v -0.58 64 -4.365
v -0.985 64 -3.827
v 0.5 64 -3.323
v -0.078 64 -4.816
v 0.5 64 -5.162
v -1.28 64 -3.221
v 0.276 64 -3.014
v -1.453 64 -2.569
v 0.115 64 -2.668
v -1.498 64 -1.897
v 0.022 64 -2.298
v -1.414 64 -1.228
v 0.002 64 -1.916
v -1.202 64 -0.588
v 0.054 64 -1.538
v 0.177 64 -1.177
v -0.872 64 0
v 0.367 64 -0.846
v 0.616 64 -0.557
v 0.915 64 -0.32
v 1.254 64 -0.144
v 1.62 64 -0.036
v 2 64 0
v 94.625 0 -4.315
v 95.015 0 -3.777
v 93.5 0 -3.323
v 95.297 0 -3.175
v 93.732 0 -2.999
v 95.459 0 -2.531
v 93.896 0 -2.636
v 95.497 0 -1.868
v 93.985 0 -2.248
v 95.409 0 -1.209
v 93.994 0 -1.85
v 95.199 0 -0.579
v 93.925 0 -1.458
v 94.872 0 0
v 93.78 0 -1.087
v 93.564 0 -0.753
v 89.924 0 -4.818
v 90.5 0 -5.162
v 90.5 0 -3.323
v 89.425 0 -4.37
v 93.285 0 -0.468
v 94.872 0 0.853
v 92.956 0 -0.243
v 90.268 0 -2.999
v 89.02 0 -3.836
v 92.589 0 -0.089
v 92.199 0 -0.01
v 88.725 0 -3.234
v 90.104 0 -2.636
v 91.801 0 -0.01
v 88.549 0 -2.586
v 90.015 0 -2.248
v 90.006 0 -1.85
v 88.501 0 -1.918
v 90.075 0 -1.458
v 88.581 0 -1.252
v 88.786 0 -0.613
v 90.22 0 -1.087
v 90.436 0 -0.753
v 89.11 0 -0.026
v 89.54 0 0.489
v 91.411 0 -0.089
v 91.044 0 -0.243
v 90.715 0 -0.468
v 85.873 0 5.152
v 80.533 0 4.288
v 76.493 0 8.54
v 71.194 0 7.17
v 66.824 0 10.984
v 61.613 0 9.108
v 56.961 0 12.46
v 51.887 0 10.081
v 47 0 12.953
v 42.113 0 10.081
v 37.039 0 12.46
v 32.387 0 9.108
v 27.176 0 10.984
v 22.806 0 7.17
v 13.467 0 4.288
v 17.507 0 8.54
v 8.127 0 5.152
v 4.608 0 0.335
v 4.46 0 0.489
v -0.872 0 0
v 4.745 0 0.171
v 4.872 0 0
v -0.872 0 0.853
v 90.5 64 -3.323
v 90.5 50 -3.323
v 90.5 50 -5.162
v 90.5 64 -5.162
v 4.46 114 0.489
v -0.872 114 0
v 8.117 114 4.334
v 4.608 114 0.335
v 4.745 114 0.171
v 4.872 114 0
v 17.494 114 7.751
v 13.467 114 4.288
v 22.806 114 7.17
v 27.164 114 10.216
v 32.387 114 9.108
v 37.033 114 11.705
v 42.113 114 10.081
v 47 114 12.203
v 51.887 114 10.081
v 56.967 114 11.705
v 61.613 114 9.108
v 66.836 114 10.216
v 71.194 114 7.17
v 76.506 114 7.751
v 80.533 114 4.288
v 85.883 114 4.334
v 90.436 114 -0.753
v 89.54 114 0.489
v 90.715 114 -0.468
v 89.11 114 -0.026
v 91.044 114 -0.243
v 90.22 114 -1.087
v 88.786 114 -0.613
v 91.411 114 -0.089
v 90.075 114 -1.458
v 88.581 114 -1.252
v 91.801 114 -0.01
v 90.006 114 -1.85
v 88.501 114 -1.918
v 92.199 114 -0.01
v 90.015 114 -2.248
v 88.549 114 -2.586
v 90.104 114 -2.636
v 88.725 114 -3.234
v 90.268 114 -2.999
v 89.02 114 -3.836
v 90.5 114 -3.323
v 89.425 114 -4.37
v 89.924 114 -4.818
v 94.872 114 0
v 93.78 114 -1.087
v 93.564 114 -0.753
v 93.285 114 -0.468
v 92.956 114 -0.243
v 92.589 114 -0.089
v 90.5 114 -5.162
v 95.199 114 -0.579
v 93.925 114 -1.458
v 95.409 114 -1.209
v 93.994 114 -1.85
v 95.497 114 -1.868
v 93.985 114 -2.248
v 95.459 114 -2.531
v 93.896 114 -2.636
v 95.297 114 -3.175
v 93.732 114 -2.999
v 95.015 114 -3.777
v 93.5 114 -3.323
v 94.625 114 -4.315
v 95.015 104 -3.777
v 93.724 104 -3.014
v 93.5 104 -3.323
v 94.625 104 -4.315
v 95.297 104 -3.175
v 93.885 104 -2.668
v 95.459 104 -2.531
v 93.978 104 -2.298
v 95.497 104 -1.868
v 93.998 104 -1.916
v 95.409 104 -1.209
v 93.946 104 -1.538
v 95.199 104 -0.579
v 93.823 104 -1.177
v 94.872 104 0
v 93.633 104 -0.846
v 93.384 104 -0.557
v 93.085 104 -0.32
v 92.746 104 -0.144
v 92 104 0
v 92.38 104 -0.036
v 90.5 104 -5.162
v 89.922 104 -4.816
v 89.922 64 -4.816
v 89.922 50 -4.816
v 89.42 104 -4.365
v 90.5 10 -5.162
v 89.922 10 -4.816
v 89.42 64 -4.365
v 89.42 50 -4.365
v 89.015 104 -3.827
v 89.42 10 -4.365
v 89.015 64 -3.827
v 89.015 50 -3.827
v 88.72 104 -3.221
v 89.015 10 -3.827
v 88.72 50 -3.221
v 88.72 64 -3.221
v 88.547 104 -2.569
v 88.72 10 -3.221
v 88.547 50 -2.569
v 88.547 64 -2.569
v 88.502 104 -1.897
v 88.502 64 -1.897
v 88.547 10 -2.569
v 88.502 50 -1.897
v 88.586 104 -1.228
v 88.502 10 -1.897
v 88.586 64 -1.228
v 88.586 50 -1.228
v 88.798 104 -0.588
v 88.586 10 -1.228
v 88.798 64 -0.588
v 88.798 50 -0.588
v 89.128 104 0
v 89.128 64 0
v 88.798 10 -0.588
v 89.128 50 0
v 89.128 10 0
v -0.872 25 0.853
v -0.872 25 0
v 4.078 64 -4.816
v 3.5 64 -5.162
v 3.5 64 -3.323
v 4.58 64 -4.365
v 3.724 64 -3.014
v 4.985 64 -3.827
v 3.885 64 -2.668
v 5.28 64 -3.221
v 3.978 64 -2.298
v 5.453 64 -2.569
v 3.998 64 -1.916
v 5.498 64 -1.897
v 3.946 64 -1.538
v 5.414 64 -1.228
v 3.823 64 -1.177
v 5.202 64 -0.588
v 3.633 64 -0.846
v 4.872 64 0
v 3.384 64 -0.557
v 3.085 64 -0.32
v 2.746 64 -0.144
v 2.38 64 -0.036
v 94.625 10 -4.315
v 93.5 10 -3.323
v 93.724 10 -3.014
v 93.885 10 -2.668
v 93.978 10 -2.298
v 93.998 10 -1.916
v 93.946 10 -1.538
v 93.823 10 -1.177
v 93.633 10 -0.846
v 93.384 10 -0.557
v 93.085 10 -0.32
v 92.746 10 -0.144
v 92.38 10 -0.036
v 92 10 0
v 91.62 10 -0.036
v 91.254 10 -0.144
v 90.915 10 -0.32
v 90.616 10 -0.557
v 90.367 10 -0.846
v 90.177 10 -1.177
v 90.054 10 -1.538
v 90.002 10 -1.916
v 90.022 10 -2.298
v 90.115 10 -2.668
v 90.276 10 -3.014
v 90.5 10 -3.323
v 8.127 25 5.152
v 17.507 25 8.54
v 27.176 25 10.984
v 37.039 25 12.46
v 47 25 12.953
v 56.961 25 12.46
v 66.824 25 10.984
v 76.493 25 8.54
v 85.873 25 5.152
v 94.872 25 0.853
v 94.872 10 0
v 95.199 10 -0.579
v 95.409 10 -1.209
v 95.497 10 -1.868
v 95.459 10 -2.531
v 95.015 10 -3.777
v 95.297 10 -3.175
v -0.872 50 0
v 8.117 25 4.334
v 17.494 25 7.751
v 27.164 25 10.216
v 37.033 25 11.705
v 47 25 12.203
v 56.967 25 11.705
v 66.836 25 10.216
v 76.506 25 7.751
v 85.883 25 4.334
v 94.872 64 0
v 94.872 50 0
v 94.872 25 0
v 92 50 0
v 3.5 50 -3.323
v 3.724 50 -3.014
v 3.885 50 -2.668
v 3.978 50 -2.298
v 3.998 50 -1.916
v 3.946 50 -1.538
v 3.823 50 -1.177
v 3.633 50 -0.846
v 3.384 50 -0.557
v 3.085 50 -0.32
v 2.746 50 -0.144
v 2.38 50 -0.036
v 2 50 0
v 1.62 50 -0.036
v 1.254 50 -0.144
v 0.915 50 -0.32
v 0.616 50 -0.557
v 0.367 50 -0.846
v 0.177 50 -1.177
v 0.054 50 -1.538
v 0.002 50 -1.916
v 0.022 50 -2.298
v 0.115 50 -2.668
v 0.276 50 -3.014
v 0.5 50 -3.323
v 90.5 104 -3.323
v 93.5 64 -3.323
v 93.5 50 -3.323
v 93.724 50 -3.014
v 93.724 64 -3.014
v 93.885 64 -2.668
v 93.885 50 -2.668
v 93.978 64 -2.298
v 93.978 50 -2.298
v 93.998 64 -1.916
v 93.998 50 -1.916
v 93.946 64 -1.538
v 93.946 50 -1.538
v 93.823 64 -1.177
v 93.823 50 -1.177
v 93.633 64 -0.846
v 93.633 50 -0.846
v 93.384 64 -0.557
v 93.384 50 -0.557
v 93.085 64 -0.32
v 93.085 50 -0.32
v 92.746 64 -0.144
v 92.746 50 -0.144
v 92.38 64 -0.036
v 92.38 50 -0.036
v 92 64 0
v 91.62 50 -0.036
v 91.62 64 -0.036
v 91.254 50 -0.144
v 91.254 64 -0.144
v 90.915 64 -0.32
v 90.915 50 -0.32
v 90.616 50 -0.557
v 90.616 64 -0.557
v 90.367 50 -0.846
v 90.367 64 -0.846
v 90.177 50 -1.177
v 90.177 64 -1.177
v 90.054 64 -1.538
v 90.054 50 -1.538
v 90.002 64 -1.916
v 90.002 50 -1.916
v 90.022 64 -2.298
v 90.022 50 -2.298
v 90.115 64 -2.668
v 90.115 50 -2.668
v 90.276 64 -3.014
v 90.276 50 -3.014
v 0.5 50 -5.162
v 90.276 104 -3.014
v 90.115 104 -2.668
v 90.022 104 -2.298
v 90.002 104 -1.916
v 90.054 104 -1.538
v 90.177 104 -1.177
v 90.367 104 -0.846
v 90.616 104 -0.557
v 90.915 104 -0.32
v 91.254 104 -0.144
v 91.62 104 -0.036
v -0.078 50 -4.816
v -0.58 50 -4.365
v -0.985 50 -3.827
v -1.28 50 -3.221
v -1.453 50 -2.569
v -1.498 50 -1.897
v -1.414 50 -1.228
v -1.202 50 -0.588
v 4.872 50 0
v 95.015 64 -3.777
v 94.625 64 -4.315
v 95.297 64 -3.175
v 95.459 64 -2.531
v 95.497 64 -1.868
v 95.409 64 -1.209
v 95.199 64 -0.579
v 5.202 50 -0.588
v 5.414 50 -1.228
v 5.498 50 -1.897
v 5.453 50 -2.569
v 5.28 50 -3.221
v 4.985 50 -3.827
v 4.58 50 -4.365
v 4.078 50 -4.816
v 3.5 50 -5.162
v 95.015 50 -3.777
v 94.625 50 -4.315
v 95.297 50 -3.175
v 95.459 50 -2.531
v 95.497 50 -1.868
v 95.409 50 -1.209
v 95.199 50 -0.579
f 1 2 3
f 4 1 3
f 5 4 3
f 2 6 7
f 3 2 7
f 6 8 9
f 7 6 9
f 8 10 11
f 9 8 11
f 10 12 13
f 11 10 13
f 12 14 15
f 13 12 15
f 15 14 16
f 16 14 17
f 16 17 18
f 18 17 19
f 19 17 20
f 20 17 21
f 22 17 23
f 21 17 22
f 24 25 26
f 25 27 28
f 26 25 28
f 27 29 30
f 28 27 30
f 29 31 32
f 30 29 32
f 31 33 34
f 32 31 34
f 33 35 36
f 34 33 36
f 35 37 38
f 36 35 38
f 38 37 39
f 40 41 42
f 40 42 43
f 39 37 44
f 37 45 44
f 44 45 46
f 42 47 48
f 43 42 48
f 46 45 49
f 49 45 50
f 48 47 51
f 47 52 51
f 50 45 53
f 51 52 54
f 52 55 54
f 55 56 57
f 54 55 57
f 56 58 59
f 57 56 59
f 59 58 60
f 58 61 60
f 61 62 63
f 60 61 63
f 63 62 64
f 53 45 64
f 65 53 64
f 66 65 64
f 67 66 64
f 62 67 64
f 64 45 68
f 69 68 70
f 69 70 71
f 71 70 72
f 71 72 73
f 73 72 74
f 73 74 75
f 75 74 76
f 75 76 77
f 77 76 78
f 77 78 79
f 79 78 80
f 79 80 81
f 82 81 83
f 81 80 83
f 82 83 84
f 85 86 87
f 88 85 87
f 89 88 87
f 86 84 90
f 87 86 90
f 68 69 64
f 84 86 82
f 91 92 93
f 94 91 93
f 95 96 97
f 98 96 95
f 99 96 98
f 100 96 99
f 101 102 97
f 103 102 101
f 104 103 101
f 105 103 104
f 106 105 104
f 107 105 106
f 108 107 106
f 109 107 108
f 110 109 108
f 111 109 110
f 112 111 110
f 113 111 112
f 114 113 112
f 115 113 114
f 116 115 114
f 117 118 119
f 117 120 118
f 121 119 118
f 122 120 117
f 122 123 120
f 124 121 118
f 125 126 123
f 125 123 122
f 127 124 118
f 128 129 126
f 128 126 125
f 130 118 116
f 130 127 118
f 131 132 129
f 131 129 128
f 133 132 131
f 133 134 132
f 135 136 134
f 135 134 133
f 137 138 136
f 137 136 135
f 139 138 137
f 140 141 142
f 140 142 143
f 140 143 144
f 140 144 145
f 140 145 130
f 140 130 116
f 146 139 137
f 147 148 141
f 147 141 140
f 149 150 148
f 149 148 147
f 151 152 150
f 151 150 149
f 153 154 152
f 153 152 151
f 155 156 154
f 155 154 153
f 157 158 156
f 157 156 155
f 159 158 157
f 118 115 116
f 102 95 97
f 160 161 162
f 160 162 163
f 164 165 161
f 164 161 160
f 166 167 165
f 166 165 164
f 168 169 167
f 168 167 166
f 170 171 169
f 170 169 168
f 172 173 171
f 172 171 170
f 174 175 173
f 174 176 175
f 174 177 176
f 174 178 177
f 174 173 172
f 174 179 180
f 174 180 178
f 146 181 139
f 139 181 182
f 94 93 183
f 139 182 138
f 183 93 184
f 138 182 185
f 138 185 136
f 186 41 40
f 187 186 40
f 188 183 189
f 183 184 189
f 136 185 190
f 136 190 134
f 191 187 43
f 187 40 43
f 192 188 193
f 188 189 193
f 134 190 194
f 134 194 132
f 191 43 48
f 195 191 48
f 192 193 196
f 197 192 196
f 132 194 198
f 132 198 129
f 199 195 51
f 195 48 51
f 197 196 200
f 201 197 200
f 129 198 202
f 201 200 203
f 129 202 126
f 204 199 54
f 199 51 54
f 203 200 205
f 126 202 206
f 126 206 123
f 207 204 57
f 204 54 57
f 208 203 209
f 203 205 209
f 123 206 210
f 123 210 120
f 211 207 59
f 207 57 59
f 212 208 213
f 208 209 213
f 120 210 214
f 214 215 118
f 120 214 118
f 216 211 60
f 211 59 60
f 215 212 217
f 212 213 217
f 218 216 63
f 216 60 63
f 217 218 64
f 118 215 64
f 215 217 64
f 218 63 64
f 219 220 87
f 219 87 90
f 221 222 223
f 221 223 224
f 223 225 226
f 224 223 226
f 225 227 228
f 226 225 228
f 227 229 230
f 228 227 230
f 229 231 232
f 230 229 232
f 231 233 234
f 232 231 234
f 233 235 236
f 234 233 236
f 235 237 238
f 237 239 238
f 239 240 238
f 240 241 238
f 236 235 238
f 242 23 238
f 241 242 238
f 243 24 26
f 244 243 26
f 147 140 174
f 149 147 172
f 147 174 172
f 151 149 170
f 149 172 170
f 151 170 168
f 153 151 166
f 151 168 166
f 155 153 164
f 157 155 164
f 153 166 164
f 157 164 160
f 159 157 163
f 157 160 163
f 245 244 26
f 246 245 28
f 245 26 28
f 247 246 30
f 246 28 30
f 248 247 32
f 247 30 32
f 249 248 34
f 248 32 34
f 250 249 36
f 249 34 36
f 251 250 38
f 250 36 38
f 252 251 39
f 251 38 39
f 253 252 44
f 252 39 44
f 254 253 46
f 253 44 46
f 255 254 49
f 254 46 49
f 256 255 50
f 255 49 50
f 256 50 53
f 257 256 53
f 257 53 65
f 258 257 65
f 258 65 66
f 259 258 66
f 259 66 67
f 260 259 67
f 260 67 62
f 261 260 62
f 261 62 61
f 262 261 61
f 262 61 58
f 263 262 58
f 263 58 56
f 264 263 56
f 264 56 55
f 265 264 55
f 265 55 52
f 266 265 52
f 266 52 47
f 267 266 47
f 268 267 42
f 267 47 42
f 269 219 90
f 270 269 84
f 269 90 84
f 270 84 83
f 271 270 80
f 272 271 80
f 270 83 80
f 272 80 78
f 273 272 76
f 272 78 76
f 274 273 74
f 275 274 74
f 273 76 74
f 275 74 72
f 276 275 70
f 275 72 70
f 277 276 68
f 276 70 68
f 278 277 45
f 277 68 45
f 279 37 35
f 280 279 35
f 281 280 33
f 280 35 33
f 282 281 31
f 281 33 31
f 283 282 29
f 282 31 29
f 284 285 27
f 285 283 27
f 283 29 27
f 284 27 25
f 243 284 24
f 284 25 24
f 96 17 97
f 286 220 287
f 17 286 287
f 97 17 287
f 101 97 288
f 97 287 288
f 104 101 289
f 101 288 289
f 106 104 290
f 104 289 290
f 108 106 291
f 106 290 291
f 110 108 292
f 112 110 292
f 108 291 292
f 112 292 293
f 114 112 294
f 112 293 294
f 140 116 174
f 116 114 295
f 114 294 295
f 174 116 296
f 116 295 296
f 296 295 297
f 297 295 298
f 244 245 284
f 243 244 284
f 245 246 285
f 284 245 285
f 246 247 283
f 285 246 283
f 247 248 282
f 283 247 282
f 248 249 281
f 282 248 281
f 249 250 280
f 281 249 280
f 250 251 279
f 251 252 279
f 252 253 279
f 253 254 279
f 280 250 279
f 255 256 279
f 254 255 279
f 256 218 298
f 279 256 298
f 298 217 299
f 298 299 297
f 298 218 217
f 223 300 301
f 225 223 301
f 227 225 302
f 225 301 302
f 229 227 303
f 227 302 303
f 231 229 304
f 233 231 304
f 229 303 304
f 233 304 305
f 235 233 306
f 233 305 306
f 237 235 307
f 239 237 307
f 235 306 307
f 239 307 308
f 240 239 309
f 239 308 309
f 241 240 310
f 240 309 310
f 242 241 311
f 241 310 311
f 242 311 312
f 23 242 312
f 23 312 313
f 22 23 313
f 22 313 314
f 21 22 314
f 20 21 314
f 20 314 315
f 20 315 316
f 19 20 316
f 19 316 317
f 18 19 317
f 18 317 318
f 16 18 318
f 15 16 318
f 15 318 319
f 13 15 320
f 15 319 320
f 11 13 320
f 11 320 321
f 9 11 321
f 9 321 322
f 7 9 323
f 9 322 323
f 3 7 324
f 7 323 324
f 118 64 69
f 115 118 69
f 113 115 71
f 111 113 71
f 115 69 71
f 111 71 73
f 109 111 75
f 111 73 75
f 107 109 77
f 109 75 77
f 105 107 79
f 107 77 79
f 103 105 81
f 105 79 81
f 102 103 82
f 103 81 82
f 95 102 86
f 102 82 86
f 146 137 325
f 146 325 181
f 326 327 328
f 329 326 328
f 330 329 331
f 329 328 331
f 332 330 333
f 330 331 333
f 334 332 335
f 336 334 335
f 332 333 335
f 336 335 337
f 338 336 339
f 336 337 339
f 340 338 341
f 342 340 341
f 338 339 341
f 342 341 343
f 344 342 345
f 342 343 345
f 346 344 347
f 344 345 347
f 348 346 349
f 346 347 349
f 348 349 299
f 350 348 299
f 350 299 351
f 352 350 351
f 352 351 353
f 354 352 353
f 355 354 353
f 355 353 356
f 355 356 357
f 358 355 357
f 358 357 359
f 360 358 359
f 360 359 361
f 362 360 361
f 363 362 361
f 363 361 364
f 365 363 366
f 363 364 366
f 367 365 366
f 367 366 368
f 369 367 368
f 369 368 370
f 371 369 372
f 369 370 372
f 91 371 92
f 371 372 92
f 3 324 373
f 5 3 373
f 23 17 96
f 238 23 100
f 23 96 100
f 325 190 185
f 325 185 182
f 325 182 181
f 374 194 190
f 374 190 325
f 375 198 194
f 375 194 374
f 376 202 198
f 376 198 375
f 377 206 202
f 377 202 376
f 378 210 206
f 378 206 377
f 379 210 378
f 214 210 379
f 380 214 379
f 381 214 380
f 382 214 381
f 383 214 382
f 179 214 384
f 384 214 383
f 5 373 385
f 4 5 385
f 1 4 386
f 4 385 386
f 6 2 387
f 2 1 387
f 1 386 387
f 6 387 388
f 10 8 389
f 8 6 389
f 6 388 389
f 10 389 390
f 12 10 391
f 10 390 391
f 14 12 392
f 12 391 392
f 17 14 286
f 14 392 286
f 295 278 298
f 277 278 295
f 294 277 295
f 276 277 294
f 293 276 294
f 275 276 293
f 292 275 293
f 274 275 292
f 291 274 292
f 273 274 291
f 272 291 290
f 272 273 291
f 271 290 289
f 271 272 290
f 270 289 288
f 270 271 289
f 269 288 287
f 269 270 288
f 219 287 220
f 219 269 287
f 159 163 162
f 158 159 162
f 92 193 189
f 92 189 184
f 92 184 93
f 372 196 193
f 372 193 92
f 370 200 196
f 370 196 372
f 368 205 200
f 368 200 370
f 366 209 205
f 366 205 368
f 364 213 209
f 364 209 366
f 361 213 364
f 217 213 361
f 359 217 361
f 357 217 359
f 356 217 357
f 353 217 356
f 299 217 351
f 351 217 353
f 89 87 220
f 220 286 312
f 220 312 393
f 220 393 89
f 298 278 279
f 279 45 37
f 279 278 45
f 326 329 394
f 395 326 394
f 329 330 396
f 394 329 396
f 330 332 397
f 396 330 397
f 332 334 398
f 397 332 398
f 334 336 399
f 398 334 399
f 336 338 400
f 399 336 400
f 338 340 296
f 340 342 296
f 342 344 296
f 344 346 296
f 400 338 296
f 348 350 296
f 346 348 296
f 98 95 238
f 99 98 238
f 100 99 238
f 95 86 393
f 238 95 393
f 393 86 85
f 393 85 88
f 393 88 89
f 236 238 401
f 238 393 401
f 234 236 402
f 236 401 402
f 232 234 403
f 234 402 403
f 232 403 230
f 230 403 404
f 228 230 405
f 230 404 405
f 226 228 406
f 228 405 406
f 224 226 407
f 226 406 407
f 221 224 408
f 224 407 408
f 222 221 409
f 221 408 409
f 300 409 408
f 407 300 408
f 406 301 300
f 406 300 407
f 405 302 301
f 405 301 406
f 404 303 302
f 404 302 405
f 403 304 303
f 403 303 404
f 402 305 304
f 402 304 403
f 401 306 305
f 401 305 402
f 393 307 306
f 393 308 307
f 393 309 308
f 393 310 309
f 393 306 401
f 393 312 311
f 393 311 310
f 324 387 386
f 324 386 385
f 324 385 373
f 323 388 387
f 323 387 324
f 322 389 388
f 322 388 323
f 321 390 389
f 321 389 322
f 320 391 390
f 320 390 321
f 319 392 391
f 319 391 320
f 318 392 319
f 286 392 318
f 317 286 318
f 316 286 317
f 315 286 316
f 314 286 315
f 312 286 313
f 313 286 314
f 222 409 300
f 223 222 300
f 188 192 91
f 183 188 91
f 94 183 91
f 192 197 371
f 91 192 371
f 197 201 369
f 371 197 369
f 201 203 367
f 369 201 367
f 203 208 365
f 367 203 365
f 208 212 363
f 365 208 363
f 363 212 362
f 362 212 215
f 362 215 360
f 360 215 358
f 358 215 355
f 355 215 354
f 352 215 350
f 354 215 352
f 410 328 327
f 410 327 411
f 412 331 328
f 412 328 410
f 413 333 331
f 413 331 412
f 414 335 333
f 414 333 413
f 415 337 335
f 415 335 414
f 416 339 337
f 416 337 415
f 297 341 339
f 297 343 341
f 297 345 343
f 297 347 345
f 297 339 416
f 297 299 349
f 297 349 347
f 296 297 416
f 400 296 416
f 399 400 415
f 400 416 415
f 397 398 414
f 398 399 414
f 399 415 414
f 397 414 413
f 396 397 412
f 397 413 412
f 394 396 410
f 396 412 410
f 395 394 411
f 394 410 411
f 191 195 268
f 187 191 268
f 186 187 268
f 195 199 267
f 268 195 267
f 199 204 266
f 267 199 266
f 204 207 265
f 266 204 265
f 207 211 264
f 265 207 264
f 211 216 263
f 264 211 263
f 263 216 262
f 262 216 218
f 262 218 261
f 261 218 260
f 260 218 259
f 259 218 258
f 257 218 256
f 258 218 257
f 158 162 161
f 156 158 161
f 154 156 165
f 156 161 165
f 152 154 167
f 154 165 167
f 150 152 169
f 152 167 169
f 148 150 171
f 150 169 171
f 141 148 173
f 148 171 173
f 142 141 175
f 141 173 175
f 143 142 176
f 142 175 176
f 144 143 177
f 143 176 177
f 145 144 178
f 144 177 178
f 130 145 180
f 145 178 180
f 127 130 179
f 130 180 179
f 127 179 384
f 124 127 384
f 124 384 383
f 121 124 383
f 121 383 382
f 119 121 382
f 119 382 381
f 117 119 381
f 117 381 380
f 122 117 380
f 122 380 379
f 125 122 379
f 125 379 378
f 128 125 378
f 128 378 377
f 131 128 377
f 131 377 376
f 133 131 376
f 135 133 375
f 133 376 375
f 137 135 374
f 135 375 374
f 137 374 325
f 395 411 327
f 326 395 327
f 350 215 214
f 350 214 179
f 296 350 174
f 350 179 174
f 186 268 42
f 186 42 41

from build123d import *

# Parameters (mm, degrees)
EXTRUDE_1_DEPTH     = 114
EXTRUDE_2_DEPTH     = 25
SKETCH_4_W          = 16.237843285
SKETCH_4_H          = 40
SKETCH_4_W_2        = 18.842025699
SKETCH_4_H_2        = 50
SKETCH_4_W_3        = 19.914336105
CUT_EXTRUDE_1_DEPTH = 20


with BuildPart() as part:
    # 草图1 → 凸台-拉伸1 (new body)
    with BuildSketch(Plane(origin=(0, 0, 0), x_dir=(1, 0, 0), z_dir=(0, 1, 0))):
        with BuildLine():
            Line((90.5, 3.322875656), (90.5, 5.16227766))
            ThreePointArc((90.5, 5.16227766), (88.549473904, 2.586404006), (89.539550125, -0.489214015))
            ThreePointArc((89.539550125, -0.489214015), (47, -10.203390265), (4.460449875, -0.489214015))
            ThreePointArc((4.460449875, -0.489214015), (5.450526096, 2.586404006), (3.5, 5.16227766))
            Line((3.5, 5.16227766), (3.5, 3.322875656))
            ThreePointArc((3.5, 3.322875656), (2, 0), (0.5, 3.322875656))
            Line((0.5, 3.322875656), (0.5, 5.16227766))
            ThreePointArc((0.5, 5.16227766), (-1.382526963, 2.89917259), (-0.872281323, 0))
            ThreePointArc((-0.872281323, 0), (47, -12.203390265), (94.872281323, 0))
            ThreePointArc((94.872281323, 0), (95.494266967, 2.200245764), (94.625, 4.315032397))
            Line((94.625, 4.315032397), (93.5, 3.322875656))
            ThreePointArc((93.5, 3.322875656), (92, 0), (90.5, 3.322875656))
        make_face()
    extrude(amount=EXTRUDE_1_DEPTH)

    # 草图3 → 凸台-拉伸2 (add)
    with BuildSketch(Plane.XZ):
        with BuildLine():
            Line((-0.872281323, 0), (-0.872281323, 0.853303863))
            ThreePointArc((-0.872281323, 0.853303863), (47, 12.953390265), (94.872281323, 0.853303863))
            Line((94.872281323, 0.853303863), (94.872281323, 0))
            ThreePointArc((94.872281323, 0), (47, 12.203390265), (-0.872281323, 0))
        make_face()
    extrude(amount=-EXTRUDE_2_DEPTH)

    # 草图4 → 切除-拉伸1 (cut)
    with BuildSketch(Plane.XY):
        with Locations((92.649785841, 84)):
            Rectangle(SKETCH_4_W, SKETCH_4_H)
        with Locations((92.649785841, 30)):
            Rectangle(SKETCH_4_W, SKETCH_4_H)
        with Locations((0.967246157, 89)):
            Rectangle(SKETCH_4_W_2, SKETCH_4_H_2)
        with Locations((1.50340136, 25)):
            Rectangle(SKETCH_4_W_3, SKETCH_4_H_2)
    extrude(amount=-CUT_EXTRUDE_1_DEPTH, mode=Mode.SUBTRACT)


solid = part.part
